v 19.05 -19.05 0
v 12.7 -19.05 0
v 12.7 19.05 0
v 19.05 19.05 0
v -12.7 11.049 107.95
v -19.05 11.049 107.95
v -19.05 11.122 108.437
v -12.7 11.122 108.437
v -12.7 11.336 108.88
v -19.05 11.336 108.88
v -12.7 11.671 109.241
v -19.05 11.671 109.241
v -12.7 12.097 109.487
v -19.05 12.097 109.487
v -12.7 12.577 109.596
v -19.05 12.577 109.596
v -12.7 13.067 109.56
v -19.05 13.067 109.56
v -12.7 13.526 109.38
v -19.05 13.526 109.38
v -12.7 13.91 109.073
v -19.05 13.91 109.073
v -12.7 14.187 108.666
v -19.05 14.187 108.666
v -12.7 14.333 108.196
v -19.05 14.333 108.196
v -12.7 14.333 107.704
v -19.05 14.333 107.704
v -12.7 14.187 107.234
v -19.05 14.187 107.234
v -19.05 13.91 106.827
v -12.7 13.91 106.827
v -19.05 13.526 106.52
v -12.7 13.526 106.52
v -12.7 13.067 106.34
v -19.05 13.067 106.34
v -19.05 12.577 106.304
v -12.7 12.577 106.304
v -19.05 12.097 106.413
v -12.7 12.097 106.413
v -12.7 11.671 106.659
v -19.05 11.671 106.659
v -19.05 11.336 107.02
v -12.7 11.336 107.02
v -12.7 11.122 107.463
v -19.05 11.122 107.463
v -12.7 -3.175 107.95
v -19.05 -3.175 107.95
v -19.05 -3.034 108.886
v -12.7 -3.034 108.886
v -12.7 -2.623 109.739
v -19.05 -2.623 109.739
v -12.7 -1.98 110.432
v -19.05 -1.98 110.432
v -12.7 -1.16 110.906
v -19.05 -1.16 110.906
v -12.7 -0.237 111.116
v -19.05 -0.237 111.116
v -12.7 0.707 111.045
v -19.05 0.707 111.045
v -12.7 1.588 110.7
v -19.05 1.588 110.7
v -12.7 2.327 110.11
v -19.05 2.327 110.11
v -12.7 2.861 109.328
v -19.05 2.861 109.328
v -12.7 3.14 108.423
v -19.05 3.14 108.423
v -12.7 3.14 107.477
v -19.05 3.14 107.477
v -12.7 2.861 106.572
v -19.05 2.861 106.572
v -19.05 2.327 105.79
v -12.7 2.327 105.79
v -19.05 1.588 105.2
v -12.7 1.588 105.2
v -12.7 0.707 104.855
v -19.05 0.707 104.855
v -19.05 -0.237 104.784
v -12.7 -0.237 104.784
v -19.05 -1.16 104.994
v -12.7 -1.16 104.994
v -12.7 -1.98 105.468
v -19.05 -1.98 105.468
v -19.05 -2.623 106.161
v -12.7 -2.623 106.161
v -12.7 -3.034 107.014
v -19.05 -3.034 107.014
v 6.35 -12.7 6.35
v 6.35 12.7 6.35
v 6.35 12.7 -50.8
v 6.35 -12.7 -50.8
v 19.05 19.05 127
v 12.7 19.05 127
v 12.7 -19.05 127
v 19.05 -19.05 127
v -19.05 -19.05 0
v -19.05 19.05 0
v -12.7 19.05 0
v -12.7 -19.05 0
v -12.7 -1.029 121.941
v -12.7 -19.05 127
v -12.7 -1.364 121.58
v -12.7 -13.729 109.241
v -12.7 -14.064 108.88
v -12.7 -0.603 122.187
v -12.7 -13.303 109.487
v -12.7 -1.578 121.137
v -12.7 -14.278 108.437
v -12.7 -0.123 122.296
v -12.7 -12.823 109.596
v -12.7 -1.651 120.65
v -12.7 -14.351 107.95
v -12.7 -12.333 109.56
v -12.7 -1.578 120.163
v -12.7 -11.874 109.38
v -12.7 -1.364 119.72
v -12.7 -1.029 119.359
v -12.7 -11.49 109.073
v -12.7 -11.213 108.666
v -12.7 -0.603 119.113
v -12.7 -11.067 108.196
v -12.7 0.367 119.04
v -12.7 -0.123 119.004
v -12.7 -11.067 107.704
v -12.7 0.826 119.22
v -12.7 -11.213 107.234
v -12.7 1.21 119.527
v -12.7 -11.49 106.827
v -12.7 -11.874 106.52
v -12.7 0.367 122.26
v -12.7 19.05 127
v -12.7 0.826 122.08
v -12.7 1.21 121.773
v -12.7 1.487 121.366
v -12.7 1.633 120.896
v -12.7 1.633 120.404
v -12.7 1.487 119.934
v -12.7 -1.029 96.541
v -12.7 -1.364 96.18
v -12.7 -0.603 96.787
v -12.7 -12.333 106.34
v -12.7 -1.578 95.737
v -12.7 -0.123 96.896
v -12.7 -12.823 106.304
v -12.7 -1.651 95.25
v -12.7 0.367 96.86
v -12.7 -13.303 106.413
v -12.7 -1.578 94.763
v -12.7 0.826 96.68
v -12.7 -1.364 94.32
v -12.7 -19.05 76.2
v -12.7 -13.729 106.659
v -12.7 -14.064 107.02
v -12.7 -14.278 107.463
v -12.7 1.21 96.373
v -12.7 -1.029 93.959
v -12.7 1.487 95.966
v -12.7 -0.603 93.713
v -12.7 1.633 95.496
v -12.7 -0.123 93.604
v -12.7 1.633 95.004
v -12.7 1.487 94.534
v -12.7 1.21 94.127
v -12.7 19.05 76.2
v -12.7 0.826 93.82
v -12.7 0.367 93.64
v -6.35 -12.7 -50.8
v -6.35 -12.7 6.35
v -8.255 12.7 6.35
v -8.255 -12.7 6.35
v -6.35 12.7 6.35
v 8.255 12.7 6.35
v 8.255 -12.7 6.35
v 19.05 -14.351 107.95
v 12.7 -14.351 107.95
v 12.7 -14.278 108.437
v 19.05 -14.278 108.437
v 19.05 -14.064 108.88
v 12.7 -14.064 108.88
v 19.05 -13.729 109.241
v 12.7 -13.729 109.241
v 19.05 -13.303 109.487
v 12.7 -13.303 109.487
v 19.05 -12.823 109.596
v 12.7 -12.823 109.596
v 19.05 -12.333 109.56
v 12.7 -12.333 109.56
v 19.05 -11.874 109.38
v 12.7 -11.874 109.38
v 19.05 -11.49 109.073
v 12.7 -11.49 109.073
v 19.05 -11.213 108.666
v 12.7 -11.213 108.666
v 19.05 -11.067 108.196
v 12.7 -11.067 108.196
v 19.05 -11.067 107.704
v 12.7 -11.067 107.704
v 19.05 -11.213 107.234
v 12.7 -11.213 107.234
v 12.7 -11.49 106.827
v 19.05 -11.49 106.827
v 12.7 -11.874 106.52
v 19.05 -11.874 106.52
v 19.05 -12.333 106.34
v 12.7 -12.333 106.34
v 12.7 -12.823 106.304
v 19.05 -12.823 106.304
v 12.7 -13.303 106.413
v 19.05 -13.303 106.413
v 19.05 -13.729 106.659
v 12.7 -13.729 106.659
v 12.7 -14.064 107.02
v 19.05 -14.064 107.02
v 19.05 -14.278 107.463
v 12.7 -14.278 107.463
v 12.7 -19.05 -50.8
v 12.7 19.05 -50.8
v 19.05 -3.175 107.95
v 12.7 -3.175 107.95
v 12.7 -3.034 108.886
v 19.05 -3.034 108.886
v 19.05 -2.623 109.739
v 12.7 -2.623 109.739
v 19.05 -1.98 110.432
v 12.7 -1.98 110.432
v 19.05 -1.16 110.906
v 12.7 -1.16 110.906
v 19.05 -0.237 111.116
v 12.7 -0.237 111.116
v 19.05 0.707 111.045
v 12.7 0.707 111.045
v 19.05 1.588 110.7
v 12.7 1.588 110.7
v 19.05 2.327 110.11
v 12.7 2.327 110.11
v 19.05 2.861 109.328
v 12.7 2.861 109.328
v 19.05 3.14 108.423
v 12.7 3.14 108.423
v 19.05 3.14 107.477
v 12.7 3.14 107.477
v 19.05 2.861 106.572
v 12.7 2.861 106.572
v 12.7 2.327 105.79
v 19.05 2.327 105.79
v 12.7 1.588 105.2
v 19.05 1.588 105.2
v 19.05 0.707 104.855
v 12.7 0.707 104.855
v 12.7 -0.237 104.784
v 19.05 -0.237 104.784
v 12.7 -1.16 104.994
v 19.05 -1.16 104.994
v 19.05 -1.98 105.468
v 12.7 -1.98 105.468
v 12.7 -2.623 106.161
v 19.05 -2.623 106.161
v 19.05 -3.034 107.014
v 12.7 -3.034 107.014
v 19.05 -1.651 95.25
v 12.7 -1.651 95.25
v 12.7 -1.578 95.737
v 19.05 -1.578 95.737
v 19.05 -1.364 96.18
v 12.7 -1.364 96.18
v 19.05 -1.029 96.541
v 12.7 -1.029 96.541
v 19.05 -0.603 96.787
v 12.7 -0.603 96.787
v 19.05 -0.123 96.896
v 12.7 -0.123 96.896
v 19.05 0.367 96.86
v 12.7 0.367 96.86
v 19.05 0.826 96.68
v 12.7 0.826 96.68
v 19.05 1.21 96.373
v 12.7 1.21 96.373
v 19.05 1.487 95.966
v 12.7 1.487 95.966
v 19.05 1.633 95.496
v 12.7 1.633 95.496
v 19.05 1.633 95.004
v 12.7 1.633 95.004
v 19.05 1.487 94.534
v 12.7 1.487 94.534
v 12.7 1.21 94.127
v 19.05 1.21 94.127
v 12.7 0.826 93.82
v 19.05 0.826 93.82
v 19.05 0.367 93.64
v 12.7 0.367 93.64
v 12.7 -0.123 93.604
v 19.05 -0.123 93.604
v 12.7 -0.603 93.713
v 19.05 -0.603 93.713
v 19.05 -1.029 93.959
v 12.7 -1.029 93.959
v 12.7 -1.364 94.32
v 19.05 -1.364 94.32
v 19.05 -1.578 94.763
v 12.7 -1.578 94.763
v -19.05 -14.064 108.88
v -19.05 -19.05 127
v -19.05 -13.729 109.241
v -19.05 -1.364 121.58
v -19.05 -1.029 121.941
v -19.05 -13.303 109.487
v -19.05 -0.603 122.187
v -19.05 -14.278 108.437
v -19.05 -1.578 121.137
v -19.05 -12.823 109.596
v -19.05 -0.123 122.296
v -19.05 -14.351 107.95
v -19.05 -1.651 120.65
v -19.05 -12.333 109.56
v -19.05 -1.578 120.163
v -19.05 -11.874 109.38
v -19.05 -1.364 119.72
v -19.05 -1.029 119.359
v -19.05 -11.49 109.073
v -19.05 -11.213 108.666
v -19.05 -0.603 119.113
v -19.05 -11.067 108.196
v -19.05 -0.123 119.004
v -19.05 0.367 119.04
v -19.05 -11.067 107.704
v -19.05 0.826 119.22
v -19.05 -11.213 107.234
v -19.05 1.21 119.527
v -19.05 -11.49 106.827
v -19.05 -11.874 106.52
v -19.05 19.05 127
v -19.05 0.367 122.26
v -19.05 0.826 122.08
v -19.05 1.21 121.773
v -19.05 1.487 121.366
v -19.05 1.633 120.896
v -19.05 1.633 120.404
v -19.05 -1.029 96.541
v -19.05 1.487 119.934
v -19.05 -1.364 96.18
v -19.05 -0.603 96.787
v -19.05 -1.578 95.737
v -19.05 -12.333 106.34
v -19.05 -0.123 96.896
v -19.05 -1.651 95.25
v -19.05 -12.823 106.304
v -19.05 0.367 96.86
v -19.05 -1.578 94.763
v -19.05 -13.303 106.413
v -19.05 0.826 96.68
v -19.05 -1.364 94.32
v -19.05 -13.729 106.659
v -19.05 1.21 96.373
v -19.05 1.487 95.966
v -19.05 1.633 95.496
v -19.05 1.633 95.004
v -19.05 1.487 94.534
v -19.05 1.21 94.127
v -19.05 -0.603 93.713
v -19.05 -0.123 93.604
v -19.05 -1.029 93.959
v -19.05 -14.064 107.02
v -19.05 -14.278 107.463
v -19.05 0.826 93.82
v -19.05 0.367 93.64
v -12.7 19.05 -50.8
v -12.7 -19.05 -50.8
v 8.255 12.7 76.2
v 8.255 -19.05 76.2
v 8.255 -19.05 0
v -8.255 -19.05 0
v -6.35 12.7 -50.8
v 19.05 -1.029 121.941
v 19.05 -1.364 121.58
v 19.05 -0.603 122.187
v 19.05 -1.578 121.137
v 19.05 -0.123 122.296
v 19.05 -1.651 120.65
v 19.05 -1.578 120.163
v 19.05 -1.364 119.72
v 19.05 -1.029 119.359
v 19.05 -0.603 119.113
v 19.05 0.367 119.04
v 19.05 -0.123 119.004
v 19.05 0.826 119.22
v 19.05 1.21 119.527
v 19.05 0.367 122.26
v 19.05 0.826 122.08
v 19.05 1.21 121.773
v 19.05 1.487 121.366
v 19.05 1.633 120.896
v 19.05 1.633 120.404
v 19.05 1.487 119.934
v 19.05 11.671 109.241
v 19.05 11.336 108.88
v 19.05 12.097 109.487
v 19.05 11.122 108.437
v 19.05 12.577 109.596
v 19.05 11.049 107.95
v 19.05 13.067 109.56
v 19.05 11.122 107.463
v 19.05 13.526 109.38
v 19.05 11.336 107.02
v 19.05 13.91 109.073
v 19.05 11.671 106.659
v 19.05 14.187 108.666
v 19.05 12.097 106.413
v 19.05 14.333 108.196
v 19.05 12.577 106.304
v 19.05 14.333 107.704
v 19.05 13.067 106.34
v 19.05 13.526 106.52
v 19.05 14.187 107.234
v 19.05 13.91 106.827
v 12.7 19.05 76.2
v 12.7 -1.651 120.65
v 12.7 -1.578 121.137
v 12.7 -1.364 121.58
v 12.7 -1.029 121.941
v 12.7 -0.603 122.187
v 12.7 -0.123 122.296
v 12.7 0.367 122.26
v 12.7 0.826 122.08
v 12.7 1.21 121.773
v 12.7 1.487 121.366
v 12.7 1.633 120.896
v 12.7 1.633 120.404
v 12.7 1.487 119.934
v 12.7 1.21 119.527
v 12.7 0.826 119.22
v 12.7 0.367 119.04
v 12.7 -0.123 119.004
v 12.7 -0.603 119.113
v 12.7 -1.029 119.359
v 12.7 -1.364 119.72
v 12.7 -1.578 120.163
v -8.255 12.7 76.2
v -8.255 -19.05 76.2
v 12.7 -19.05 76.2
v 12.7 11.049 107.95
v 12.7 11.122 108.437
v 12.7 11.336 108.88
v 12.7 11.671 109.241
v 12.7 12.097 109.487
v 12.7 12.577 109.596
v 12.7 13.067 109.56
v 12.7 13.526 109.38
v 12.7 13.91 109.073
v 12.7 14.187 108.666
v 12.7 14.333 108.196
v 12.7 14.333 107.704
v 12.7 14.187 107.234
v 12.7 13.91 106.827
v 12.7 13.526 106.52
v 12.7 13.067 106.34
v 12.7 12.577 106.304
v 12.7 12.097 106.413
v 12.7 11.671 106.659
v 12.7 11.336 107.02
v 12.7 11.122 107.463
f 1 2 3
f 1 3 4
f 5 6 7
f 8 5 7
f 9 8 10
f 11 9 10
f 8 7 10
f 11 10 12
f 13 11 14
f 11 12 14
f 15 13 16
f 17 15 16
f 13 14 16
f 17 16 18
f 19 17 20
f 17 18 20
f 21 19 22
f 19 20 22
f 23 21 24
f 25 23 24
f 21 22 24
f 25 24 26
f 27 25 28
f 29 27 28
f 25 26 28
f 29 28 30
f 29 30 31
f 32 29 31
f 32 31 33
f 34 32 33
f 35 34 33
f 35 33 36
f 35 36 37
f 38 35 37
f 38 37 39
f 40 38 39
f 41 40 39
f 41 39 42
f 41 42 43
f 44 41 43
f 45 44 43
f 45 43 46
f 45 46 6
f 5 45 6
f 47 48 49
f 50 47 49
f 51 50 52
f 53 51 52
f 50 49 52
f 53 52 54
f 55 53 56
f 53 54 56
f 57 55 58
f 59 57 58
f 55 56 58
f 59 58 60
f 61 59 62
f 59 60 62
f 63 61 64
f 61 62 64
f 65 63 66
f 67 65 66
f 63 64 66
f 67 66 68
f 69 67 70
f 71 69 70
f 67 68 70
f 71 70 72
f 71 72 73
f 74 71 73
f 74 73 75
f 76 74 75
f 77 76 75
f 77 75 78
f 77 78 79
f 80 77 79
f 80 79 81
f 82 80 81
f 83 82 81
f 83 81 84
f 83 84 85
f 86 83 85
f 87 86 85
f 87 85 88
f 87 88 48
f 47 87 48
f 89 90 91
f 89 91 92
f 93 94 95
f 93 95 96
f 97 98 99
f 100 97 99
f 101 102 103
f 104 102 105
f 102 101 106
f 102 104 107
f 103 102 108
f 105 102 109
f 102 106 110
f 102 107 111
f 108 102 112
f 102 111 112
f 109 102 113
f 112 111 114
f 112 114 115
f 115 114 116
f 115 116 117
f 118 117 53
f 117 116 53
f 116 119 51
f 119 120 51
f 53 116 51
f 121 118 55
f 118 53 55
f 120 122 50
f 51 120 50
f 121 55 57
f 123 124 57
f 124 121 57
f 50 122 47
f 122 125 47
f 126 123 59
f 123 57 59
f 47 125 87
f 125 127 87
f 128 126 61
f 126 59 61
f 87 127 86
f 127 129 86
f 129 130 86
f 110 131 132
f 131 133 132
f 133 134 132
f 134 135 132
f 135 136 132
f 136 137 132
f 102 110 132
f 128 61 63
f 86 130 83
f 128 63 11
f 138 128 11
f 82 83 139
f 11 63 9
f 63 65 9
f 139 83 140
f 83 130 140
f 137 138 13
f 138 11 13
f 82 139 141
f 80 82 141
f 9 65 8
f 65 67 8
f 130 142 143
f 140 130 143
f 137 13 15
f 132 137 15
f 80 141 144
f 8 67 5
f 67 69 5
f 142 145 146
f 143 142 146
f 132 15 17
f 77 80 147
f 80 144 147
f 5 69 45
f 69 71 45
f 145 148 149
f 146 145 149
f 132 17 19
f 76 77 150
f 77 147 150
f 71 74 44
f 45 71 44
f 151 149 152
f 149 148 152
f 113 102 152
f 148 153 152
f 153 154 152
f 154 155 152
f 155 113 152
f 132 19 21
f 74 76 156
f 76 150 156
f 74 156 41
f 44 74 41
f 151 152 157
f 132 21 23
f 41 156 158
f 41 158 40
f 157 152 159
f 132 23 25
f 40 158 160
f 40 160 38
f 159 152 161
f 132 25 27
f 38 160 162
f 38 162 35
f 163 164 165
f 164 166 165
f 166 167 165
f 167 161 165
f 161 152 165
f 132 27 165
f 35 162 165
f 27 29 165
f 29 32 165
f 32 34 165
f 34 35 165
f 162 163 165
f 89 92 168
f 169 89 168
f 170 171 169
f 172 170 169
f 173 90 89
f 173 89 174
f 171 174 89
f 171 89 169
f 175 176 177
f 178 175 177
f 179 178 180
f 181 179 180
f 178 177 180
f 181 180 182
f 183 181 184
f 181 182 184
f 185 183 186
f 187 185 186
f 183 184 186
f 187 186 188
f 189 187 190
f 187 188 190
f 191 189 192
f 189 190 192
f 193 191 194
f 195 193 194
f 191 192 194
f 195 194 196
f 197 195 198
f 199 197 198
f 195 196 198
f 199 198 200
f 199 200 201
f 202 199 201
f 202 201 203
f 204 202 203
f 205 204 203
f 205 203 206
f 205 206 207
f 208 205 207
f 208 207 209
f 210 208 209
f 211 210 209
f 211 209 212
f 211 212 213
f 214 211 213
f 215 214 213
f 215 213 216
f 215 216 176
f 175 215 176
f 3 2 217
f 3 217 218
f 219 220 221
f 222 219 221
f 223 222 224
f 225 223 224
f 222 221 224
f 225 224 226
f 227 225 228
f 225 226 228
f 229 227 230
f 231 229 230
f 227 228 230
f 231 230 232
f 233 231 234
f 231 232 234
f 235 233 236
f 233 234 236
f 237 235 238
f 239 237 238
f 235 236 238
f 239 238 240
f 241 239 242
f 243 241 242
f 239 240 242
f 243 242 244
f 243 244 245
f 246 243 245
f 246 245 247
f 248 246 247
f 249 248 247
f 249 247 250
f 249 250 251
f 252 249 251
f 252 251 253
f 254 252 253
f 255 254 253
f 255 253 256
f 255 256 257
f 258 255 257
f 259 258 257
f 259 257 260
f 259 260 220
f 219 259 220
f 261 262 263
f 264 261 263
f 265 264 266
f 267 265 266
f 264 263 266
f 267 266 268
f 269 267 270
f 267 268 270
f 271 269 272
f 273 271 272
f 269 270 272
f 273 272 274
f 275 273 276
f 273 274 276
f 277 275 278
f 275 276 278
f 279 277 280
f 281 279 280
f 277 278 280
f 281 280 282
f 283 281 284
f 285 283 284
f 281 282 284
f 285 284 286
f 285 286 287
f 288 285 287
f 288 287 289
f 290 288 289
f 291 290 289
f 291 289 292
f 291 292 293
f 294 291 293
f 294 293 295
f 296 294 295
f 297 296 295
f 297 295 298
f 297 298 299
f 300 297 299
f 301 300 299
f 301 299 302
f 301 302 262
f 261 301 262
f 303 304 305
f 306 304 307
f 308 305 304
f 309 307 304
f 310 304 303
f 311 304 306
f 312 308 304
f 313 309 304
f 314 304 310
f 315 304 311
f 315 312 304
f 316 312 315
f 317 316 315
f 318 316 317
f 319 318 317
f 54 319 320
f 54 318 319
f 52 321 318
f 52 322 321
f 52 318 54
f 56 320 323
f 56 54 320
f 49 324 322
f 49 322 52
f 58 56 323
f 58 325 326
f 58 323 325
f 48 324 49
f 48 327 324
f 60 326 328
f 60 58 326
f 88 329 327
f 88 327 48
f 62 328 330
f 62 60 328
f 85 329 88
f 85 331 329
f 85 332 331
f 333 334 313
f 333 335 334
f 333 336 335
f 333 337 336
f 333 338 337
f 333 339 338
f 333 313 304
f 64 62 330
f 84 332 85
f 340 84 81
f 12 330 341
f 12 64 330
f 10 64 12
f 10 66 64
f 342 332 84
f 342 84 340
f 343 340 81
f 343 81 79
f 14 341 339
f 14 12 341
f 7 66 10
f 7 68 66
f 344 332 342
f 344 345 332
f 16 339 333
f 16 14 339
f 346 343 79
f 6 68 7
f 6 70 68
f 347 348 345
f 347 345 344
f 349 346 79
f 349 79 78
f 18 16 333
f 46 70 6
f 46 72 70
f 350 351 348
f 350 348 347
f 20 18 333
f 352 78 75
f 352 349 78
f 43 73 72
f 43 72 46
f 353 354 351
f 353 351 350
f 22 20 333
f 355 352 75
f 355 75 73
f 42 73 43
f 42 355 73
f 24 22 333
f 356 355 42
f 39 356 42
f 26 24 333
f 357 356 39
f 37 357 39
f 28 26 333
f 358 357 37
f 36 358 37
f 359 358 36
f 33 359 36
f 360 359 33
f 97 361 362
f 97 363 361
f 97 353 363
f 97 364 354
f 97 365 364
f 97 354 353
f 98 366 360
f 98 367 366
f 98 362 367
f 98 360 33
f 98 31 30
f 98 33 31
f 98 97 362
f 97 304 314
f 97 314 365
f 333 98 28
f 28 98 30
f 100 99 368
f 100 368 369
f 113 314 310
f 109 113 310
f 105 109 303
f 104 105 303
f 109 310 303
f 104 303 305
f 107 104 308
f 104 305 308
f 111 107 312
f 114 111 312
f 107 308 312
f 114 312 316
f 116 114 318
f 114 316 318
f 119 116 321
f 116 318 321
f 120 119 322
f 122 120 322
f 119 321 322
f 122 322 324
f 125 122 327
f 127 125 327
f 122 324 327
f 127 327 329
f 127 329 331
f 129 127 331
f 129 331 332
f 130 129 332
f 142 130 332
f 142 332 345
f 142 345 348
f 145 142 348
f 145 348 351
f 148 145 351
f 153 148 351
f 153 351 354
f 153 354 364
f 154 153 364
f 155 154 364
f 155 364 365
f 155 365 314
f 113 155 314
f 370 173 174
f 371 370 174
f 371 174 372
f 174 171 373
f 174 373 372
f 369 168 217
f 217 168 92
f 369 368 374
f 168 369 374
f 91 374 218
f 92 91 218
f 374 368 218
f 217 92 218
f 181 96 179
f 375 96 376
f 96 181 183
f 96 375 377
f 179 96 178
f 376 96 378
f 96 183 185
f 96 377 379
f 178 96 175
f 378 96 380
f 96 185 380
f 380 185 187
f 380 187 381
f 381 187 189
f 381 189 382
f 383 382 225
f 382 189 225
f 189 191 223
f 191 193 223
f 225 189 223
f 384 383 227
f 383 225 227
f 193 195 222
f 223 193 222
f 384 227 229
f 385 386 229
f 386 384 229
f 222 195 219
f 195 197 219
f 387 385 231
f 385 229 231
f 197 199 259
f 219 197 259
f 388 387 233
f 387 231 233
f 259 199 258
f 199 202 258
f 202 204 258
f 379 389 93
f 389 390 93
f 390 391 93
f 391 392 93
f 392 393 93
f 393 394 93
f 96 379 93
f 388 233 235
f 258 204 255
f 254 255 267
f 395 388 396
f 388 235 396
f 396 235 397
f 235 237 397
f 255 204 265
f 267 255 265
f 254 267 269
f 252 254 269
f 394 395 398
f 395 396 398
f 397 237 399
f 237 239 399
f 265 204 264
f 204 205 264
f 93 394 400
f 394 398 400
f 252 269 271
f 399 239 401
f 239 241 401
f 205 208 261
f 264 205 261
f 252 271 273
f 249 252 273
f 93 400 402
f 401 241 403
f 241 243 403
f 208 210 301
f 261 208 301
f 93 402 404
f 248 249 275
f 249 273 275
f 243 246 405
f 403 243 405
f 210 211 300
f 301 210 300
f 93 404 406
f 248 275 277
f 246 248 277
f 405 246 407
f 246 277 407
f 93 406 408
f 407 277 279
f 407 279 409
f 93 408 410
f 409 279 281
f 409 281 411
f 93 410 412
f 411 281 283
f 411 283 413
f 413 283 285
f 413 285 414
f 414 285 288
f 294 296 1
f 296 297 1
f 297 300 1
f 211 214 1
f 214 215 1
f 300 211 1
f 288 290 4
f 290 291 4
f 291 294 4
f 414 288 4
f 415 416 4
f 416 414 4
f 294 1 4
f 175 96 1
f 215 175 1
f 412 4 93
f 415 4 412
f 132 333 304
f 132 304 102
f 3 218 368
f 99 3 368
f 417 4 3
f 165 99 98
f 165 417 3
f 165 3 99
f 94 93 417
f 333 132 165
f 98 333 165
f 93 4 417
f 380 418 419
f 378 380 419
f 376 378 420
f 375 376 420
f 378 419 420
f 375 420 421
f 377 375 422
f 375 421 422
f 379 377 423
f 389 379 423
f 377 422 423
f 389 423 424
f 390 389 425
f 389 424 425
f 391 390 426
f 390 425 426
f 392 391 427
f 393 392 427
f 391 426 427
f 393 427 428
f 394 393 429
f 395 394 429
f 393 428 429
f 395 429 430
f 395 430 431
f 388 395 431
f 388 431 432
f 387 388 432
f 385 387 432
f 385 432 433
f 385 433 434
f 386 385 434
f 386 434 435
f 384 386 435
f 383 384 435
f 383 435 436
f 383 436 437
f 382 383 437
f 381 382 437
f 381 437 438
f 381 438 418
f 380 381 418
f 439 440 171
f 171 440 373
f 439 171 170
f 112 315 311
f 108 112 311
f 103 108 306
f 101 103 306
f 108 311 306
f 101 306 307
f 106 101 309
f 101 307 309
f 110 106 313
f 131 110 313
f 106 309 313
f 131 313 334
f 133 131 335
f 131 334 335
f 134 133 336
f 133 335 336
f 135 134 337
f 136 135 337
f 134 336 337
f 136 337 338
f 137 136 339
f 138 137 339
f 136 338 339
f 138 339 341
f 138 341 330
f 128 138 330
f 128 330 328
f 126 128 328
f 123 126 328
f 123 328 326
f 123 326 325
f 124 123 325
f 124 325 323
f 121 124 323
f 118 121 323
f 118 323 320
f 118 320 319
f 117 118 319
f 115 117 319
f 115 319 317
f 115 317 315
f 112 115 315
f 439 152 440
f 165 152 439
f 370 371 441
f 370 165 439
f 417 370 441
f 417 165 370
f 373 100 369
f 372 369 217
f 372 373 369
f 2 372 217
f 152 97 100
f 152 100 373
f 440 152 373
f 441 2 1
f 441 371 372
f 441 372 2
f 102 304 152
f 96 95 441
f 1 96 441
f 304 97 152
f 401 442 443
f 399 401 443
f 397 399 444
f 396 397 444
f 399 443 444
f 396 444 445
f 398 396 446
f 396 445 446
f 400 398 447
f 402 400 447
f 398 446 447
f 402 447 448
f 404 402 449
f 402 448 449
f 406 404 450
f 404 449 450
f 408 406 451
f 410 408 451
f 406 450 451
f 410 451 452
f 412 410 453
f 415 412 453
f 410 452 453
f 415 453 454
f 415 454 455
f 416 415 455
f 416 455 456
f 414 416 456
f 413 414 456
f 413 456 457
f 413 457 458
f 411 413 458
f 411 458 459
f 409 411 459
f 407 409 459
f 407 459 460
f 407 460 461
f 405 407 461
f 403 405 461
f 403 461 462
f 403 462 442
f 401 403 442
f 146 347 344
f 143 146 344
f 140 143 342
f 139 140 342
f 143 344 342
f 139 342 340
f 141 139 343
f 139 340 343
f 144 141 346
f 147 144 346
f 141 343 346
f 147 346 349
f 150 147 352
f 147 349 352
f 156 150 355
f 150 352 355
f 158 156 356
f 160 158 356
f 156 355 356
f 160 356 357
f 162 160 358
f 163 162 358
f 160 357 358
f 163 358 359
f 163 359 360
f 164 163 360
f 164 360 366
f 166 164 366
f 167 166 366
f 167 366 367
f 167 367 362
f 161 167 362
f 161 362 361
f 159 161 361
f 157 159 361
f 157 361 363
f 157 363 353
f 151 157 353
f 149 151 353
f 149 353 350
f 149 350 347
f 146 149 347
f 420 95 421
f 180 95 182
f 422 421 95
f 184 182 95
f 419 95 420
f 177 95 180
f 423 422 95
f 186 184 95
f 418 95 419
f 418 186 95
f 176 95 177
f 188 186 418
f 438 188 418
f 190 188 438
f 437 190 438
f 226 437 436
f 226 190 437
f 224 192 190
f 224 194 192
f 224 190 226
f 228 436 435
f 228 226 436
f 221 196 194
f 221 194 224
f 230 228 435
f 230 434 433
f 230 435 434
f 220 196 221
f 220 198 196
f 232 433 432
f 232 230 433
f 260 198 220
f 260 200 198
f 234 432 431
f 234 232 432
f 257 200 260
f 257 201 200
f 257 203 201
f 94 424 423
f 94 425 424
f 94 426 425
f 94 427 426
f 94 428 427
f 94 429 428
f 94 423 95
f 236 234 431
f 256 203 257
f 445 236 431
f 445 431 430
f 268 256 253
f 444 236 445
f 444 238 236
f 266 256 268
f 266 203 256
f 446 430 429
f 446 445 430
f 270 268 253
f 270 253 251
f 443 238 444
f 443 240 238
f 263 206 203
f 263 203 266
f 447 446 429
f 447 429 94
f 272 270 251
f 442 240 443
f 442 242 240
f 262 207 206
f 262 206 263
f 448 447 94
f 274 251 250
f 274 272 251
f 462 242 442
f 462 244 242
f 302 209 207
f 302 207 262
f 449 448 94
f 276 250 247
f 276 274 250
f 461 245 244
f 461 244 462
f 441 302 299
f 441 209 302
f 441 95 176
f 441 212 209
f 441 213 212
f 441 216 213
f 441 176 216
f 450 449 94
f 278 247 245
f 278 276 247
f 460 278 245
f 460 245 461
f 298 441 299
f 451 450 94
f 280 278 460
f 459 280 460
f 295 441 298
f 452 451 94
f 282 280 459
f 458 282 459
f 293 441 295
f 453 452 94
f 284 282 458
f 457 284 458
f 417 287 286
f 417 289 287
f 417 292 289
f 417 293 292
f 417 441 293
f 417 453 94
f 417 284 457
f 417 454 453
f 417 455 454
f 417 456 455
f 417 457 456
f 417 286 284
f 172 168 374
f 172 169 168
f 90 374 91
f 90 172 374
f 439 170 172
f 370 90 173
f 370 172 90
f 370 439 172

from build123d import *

# Parameters (mm, degrees)
F1_DEPTH = 6.35
F2_DEPTH = 76.2
F0_W     = 6.35
F0_H     = 38.1
F3_DEPTH = 127
F5_D     = 6.35
F6_SIZE  = 6.34999
F7_D     = 3.302
F8_DEPTH = 50.8


# Not quite as in the source:
# - a fillet or chamfer is up to 0.001 mm smaller than in the source, because OpenCascade refuses the exact size


with BuildPart() as f1:
    # F0 (on Top) → F1 (new body)
    with BuildSketch(Plane.XY):
        Polygon((-6.35, -12.7), (-6.35, 12.7), (-8.255, 12.7), (-8.255, -19.05), (8.255, -19.05), (8.255, 12.7), (6.35, 12.7), (6.35, -12.7), align=None)
    extrude(amount=F1_DEPTH)

    # F0 (on Top) → F2 (join)
    with BuildSketch(Plane.XY):
        Polygon((-8.255, -19.05), (-8.255, 12.7), (-8.255, 19.05), (-12.7, 19.05), (-12.7, -19.05), align=None)
        Polygon((8.255, 19.05), (8.255, 12.7), (8.255, -19.05), (12.7, -19.05), (12.7, 19.05), align=None)
        Polygon((-8.255, 12.7), (-6.35, 12.7), (6.35, 12.7), (8.255, 12.7), (8.255, 19.05), (-8.255, 19.05), align=None)
    extrude(amount=F2_DEPTH)

    # F0 (on Top) → F3 (join)
    with BuildSketch(Plane.XY):
        with Locations((-15.875, 0)):
            Rectangle(F0_W, F0_H)
        with Locations((15.875, 0)):
            Rectangle(F0_W, F0_H)
    extrude(amount=F3_DEPTH)

    # F5 (through all)
    with Locations(Plane.YZ.offset(19.05)):
        with Locations((0, 107.95)):
            Hole(F5_D / 2)

    # F6 (size 6.35 in the source; OpenCascade refuses exactly that, so slightly less here)
    f6_edges = [f1.edges().sort_by_distance(p)[0] for p in [
        (0, -19.05, 6.35),
    ]]
    chamfer(f6_edges, length=F6_SIZE)

    # F7 (through all)
    with Locations(Plane.YZ.offset(19.05)):
        with Locations((0, 120.65), (0, 95.25), (12.7, 107.95), (-12.7, 107.95)):
            Hole(F7_D / 2)

    # F0 (on Top) → F8 (join)
    with BuildSketch(Plane.XY):
        Polygon((-8.255, 12.7), (-6.35, 12.7), (6.35, 12.7), (8.255, 12.7), (8.255, 19.05), (-8.255, 19.05), align=None)
        Polygon((-8.255, -19.05), (-8.255, 12.7), (-8.255, 19.05), (-12.7, 19.05), (-12.7, -19.05), align=None)
        Polygon((-6.35, -12.7), (-6.35, 12.7), (-8.255, 12.7), (-8.255, -19.05), (8.255, -19.05), (8.255, 12.7), (6.35, 12.7), (6.35, -12.7), align=None)
        Polygon((8.255, 19.05), (8.255, 12.7), (8.255, -19.05), (12.7, -19.05), (12.7, 19.05), align=None)
    extrude(amount=-F8_DEPTH)


solid = f1.part
